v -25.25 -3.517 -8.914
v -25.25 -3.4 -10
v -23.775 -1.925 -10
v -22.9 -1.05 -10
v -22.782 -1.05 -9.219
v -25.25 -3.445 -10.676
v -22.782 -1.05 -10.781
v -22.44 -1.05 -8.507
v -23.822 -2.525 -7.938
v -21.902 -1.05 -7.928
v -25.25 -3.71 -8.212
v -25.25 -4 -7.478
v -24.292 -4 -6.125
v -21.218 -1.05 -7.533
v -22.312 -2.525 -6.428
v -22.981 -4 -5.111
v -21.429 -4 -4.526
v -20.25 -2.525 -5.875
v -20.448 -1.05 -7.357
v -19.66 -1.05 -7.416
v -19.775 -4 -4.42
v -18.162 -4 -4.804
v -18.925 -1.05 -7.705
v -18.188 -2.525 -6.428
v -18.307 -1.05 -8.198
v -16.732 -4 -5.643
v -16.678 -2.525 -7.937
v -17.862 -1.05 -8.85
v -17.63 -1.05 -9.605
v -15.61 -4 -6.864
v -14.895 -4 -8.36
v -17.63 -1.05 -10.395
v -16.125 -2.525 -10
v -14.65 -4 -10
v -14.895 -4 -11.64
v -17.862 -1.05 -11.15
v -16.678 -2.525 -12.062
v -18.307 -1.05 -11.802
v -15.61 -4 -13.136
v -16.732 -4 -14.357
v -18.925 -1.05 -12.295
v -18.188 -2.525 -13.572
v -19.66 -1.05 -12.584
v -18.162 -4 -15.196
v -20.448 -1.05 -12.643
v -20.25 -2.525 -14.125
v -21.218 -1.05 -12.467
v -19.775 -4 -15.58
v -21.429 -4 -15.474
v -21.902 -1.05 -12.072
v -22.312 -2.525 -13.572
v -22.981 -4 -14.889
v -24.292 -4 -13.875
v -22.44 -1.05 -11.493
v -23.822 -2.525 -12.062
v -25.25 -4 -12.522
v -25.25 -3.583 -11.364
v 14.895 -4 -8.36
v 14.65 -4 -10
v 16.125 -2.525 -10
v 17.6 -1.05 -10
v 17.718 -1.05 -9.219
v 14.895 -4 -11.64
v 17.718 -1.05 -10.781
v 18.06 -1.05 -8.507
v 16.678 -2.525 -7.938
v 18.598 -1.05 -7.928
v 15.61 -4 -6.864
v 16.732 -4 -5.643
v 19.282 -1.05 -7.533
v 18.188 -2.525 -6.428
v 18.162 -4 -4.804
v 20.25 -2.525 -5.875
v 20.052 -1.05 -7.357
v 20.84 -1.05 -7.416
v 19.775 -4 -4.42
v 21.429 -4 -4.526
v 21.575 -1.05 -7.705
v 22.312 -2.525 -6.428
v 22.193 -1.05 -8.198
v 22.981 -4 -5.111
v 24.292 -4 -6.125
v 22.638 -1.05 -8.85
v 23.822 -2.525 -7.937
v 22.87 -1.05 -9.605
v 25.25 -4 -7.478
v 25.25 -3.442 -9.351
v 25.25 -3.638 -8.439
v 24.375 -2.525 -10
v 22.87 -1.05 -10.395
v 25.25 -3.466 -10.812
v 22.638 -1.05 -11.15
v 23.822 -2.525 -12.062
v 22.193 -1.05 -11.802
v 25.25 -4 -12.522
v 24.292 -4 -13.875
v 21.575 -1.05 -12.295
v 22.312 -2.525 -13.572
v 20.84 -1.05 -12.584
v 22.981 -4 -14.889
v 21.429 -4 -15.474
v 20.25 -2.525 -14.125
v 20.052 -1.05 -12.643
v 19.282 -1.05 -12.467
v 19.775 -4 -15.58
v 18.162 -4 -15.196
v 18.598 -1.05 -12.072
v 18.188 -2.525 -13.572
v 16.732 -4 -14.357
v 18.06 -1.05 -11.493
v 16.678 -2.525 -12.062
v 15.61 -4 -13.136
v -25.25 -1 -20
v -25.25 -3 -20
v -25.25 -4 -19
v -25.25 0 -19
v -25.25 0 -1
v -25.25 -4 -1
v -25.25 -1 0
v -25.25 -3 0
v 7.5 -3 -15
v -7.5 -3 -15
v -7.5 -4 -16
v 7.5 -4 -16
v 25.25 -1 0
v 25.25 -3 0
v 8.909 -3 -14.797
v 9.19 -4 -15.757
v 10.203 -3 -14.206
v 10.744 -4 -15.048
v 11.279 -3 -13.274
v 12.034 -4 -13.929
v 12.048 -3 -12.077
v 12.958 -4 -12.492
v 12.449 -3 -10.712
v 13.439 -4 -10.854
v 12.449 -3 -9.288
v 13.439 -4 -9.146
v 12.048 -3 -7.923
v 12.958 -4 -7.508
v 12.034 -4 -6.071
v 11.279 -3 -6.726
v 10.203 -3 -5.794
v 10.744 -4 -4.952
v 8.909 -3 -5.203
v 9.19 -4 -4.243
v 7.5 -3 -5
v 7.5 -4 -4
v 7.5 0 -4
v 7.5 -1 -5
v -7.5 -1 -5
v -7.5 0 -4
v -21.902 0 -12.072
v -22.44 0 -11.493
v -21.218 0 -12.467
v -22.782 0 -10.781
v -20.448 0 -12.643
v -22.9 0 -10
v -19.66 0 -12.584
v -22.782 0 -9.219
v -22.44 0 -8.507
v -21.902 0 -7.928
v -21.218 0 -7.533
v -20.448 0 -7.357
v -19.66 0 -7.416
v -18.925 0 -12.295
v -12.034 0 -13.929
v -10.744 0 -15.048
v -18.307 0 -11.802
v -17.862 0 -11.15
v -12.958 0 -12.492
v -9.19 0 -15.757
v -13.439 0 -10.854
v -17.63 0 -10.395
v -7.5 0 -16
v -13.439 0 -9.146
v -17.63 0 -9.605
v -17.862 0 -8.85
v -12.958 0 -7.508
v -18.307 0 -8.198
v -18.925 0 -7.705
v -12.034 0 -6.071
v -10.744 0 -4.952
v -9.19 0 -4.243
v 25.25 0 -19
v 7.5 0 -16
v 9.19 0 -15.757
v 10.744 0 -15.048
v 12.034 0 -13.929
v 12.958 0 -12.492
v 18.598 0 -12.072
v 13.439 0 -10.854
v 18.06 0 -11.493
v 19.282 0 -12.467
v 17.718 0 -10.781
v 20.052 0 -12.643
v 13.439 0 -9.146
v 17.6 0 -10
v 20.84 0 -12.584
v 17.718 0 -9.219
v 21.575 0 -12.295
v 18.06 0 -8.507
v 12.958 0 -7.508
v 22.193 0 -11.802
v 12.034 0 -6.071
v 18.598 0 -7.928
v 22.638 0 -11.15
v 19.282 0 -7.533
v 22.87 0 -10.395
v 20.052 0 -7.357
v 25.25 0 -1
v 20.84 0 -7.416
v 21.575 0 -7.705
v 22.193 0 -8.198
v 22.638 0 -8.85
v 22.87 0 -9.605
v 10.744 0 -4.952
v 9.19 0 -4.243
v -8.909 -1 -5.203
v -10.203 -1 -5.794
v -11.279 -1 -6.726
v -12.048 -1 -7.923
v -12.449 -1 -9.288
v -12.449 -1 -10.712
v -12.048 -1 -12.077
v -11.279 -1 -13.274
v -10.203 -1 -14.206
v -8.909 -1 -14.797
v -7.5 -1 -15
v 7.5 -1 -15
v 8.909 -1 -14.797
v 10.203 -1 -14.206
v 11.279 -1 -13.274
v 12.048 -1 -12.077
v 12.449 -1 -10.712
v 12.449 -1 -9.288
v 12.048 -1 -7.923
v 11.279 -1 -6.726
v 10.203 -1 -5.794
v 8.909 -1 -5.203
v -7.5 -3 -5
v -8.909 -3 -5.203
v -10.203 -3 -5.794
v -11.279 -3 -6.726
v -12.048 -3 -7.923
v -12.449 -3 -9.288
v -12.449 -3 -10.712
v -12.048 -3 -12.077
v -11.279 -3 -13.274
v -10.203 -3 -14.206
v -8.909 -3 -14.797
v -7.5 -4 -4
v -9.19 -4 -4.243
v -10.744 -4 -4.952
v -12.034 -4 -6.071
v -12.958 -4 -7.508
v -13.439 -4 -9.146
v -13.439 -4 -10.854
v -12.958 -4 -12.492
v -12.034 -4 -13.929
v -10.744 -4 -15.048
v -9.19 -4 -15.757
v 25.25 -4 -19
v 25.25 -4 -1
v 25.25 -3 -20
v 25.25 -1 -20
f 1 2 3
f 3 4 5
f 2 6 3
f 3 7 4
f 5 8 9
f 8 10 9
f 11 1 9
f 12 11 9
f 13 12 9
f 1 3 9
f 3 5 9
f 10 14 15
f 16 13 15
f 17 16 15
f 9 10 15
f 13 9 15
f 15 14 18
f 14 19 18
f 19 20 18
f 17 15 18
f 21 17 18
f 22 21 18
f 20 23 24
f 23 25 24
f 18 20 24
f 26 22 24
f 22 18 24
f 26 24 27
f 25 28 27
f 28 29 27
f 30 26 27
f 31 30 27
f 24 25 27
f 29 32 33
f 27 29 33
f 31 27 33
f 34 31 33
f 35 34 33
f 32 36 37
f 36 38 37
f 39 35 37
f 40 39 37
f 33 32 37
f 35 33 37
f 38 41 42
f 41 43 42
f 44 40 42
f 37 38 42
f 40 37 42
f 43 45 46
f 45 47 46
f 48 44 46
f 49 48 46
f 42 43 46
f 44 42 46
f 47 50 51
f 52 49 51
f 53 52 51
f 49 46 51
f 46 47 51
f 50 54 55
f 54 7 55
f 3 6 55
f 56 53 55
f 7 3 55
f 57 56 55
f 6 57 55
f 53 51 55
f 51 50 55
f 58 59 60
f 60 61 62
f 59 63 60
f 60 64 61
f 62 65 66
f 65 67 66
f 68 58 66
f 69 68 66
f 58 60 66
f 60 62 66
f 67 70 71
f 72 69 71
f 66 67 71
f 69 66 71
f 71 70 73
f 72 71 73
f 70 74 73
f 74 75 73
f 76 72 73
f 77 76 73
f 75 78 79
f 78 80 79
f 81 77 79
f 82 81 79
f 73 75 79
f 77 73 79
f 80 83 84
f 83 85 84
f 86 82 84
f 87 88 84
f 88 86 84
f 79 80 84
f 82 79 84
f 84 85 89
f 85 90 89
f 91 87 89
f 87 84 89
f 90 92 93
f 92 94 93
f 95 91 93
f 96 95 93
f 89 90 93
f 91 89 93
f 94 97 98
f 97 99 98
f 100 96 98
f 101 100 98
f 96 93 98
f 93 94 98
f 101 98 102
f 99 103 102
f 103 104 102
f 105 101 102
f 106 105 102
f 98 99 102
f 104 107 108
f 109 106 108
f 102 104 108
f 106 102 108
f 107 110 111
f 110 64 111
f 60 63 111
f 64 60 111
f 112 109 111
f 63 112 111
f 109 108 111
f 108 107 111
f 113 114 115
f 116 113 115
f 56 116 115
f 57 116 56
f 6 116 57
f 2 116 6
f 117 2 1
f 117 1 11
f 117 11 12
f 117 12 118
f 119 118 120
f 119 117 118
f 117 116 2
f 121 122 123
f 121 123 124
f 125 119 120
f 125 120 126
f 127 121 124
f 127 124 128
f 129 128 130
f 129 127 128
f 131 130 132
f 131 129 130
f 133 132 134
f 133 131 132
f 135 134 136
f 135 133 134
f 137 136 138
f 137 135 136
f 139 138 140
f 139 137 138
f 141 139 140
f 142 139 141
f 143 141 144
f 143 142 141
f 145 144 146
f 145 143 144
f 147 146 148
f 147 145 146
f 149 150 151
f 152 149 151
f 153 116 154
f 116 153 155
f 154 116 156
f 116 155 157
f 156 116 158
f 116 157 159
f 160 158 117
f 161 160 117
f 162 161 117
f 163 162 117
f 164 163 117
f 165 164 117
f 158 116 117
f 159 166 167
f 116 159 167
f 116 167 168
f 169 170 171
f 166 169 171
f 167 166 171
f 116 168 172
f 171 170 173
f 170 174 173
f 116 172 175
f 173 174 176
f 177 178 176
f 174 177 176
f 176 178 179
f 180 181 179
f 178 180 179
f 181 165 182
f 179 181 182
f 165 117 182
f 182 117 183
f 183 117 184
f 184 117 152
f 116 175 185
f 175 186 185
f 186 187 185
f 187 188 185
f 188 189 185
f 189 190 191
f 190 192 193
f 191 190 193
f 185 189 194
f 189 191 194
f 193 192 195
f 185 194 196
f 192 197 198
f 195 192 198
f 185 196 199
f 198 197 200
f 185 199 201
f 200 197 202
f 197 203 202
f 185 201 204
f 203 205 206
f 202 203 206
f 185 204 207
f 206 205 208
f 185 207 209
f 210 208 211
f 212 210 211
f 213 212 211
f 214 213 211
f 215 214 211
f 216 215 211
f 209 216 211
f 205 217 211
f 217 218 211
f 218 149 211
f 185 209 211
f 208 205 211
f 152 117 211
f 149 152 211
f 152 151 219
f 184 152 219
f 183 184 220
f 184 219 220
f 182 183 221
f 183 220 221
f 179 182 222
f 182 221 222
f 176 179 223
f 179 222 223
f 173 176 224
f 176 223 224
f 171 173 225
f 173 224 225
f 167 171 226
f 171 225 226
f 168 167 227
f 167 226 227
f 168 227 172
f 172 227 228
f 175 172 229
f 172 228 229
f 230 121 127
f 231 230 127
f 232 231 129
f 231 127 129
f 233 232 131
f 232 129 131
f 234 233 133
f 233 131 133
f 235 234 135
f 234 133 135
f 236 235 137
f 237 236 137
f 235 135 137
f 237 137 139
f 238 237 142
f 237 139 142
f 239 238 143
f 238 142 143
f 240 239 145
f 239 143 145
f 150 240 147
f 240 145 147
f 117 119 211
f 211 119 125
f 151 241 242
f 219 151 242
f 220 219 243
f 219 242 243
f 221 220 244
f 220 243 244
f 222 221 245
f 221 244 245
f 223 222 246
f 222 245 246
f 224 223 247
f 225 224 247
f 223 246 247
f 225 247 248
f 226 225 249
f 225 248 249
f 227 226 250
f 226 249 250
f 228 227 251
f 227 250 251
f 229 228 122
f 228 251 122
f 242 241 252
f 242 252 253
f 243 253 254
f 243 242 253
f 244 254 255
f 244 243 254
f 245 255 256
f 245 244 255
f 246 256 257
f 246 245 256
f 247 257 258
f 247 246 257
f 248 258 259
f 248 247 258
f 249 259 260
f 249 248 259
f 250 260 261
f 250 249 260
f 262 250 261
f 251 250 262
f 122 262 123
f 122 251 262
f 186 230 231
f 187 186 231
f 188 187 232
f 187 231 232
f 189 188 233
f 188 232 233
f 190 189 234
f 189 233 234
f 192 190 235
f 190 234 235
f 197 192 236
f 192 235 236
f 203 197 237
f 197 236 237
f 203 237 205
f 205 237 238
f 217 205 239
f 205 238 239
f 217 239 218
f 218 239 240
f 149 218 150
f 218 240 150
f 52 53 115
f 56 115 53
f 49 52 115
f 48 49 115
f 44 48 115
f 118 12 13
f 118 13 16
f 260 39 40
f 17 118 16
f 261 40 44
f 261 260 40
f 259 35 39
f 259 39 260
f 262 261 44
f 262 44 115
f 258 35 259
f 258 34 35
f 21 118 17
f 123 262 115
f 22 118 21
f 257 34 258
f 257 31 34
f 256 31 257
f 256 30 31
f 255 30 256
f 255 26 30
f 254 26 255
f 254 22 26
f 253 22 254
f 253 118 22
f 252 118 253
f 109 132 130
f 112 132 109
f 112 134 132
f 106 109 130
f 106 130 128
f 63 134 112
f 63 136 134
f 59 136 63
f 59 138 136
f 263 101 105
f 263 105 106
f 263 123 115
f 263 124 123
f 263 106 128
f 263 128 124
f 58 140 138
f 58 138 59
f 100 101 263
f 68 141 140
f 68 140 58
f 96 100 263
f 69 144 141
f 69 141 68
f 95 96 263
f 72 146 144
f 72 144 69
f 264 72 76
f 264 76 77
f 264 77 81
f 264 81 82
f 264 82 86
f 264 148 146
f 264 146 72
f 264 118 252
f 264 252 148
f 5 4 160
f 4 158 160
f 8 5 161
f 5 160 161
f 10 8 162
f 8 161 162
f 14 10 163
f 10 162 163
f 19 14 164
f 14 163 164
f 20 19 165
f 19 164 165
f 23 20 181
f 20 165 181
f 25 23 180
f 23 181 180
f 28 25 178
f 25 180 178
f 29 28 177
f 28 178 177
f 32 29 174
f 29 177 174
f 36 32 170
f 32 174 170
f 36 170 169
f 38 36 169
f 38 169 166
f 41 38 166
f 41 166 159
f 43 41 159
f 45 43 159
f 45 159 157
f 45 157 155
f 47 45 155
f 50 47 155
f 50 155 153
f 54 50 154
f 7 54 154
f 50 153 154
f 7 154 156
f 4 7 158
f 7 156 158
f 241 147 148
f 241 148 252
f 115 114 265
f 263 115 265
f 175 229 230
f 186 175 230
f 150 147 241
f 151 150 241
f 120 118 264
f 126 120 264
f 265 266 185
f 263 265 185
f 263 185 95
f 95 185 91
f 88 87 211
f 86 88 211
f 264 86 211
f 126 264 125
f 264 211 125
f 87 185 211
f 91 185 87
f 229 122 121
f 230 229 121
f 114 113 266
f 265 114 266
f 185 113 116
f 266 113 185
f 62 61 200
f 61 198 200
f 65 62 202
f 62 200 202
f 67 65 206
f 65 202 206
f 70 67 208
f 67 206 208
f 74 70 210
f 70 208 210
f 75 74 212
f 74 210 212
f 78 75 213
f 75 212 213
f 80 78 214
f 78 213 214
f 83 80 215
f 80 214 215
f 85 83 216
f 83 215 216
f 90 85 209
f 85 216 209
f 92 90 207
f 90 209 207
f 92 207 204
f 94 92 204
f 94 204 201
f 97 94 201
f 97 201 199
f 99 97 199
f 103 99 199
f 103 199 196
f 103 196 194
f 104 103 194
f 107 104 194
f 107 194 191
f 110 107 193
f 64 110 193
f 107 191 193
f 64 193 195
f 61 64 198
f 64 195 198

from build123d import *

# Parameters (mm, degrees)
F0_W           = 50.5
F0_H           = 20
F1_DEPTH       = 4
F3_D           = 5.3
F3_DEPTH       = 8
F3_CSINK_D     = 11.2
F3_CSINK_ANGLE = 90
F3_TIP         = 1.5922806404
F5_DEPTH       = 4.001
F6_SIZE        = 1


with BuildPart() as f1:
    # F0 (on Front) → F1 (new body)
    with BuildSketch(Plane.XZ):
        with Locations((0, -10)):
            Rectangle(F0_W, F0_H)
    extrude(amount=F1_DEPTH)

    # F3
    with Locations(Plane.XZ.offset(4)):
        with Locations((-20.25, -10), (20.25, -10)):
            CounterSinkHole(F3_D / 2, F3_CSINK_D / 2, depth=F3_DEPTH, counter_sink_angle=F3_CSINK_ANGLE)
            with Locations((0, 0, -(F3_DEPTH + F3_TIP / 2))):  # 118° drill point
                Cone(0, F3_D / 2, F3_TIP, mode=Mode.SUBTRACT)

    # F4 (on face) → F5 (cut, through all)
    with BuildSketch(Plane.XZ.offset(4)):
        with BuildLine():
            Line((7.5, -5), (-7.5, -5))
            ThreePointArc((-7.5, -5), (-12.5, -10), (-7.5, -15))
            Line((-7.5, -15), (7.5, -15))
            ThreePointArc((7.5, -15), (12.5, -10), (7.5, -5))
        make_face()
    extrude(amount=-F5_DEPTH, mode=Mode.SUBTRACT)

    # F6
    f6_edges = [f1.edges().sort_by_distance(p)[0] for p in [
        (0, -4, -20),
        (0, -4, 0),
        (0, -4, -15),
        (0, 0, -15),
        (0, 0, -20),
        (0, 0, 0),
    ]]
    chamfer(f6_edges, length=F6_SIZE)


solid = f1.part
